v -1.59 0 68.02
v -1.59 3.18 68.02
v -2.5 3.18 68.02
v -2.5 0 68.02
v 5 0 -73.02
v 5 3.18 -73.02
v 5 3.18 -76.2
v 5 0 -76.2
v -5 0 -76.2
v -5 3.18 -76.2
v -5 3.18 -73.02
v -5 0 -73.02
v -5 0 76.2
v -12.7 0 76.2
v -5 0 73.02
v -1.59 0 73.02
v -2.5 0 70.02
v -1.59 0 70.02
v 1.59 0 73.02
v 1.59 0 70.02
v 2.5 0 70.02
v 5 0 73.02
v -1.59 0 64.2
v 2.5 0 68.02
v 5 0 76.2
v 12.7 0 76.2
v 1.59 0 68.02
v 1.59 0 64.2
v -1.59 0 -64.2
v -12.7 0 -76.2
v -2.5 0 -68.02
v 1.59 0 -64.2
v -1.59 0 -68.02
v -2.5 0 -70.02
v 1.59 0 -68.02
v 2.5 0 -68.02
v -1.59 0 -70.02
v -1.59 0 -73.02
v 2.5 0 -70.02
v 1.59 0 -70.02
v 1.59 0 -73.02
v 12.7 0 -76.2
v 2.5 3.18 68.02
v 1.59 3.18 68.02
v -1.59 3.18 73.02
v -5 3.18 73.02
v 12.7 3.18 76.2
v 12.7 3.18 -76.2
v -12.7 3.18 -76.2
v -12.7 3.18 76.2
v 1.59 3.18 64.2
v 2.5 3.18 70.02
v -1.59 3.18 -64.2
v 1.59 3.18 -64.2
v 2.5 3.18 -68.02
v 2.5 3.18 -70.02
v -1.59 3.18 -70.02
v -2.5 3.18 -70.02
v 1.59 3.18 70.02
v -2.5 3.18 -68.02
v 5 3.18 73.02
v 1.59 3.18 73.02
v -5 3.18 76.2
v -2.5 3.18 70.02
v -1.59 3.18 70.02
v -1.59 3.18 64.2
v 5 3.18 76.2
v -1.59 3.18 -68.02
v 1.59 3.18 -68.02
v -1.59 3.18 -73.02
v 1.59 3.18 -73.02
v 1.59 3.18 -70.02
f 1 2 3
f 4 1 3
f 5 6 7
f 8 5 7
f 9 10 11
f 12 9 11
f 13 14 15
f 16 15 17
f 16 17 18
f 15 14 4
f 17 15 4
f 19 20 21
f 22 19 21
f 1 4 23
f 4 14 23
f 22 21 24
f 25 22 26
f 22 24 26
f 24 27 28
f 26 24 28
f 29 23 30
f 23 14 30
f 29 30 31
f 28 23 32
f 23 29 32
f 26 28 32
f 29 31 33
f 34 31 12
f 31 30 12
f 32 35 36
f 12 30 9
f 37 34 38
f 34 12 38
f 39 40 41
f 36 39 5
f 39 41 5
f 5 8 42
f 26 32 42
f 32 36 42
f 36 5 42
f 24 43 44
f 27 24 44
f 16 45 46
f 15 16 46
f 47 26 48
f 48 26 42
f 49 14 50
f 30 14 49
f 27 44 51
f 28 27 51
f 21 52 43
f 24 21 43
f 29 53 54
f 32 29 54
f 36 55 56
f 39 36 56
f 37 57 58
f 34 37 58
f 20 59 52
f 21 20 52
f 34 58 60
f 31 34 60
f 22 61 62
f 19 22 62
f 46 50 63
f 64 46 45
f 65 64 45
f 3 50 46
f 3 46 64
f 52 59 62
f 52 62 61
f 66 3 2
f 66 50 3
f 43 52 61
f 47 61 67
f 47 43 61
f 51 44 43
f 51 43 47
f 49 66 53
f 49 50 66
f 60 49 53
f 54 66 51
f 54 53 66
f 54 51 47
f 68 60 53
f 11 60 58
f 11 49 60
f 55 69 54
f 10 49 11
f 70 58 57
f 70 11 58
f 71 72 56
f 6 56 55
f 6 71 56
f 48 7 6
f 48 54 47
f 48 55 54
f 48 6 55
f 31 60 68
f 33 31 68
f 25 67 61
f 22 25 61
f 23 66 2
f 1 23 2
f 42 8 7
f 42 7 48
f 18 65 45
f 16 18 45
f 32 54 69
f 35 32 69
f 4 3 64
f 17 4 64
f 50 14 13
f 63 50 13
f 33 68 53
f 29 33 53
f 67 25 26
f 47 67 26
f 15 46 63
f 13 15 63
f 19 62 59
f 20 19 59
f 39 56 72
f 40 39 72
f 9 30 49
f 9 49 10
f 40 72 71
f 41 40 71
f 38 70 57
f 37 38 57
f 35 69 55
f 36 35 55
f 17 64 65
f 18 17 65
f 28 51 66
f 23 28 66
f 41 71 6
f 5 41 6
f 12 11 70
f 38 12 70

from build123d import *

# Parameters (mm, degrees)
SKETCH1_W           = 25.4
SKETCH1_H           = 152.4
BOSS_EXTRUDE1_DEPTH = 3.18
CUT_EXTRUDE1_DEPTH  = 3.18


with BuildPart() as part:
    # Sketch1 → Boss-Extrude1 (new body)
    with BuildSketch(Plane(origin=(0, 0, 0), x_dir=(1, 0, 0), z_dir=(0, 1, 0))):
        Rectangle(SKETCH1_W, SKETCH1_H)
    extrude(amount=BOSS_EXTRUDE1_DEPTH)

    # Sketch2 → Cut-Extrude1 (cut)
    with BuildSketch(Plane(origin=(0, 3.18, 0), x_dir=(1, 0, 0), z_dir=(0, 1, 0))):
        Polygon((-1.59, 73.02), (-1.59, 70.02), (-2.5, 70.02), (-2.5, 68.02), (-1.59, 68.02), (-1.59, 64.2), (0, 64.2), (1.59, 64.2), (1.59, 68.02), (2.5, 68.02), (2.5, 70.02), (1.59, 70.02), (1.59, 73.02), (5, 73.02), (5, 76.2), (-5, 76.2), (-5, 73.02), align=None)
        Polygon((0, -64.2), (-1.59, -64.2), (-1.59, -68.02), (-2.5, -68.02), (-2.5, -70.02), (-1.59, -70.02), (-1.59, -73.02), (-5, -73.02), (-5, -76.2), (5, -76.2), (5, -73.02), (1.59, -73.02), (1.59, -70.02), (2.5, -70.02), (2.5, -68.02), (1.59, -68.02), (1.59, -64.2), align=None)
    extrude(amount=-CUT_EXTRUDE1_DEPTH, mode=Mode.SUBTRACT)


solid = part.part
